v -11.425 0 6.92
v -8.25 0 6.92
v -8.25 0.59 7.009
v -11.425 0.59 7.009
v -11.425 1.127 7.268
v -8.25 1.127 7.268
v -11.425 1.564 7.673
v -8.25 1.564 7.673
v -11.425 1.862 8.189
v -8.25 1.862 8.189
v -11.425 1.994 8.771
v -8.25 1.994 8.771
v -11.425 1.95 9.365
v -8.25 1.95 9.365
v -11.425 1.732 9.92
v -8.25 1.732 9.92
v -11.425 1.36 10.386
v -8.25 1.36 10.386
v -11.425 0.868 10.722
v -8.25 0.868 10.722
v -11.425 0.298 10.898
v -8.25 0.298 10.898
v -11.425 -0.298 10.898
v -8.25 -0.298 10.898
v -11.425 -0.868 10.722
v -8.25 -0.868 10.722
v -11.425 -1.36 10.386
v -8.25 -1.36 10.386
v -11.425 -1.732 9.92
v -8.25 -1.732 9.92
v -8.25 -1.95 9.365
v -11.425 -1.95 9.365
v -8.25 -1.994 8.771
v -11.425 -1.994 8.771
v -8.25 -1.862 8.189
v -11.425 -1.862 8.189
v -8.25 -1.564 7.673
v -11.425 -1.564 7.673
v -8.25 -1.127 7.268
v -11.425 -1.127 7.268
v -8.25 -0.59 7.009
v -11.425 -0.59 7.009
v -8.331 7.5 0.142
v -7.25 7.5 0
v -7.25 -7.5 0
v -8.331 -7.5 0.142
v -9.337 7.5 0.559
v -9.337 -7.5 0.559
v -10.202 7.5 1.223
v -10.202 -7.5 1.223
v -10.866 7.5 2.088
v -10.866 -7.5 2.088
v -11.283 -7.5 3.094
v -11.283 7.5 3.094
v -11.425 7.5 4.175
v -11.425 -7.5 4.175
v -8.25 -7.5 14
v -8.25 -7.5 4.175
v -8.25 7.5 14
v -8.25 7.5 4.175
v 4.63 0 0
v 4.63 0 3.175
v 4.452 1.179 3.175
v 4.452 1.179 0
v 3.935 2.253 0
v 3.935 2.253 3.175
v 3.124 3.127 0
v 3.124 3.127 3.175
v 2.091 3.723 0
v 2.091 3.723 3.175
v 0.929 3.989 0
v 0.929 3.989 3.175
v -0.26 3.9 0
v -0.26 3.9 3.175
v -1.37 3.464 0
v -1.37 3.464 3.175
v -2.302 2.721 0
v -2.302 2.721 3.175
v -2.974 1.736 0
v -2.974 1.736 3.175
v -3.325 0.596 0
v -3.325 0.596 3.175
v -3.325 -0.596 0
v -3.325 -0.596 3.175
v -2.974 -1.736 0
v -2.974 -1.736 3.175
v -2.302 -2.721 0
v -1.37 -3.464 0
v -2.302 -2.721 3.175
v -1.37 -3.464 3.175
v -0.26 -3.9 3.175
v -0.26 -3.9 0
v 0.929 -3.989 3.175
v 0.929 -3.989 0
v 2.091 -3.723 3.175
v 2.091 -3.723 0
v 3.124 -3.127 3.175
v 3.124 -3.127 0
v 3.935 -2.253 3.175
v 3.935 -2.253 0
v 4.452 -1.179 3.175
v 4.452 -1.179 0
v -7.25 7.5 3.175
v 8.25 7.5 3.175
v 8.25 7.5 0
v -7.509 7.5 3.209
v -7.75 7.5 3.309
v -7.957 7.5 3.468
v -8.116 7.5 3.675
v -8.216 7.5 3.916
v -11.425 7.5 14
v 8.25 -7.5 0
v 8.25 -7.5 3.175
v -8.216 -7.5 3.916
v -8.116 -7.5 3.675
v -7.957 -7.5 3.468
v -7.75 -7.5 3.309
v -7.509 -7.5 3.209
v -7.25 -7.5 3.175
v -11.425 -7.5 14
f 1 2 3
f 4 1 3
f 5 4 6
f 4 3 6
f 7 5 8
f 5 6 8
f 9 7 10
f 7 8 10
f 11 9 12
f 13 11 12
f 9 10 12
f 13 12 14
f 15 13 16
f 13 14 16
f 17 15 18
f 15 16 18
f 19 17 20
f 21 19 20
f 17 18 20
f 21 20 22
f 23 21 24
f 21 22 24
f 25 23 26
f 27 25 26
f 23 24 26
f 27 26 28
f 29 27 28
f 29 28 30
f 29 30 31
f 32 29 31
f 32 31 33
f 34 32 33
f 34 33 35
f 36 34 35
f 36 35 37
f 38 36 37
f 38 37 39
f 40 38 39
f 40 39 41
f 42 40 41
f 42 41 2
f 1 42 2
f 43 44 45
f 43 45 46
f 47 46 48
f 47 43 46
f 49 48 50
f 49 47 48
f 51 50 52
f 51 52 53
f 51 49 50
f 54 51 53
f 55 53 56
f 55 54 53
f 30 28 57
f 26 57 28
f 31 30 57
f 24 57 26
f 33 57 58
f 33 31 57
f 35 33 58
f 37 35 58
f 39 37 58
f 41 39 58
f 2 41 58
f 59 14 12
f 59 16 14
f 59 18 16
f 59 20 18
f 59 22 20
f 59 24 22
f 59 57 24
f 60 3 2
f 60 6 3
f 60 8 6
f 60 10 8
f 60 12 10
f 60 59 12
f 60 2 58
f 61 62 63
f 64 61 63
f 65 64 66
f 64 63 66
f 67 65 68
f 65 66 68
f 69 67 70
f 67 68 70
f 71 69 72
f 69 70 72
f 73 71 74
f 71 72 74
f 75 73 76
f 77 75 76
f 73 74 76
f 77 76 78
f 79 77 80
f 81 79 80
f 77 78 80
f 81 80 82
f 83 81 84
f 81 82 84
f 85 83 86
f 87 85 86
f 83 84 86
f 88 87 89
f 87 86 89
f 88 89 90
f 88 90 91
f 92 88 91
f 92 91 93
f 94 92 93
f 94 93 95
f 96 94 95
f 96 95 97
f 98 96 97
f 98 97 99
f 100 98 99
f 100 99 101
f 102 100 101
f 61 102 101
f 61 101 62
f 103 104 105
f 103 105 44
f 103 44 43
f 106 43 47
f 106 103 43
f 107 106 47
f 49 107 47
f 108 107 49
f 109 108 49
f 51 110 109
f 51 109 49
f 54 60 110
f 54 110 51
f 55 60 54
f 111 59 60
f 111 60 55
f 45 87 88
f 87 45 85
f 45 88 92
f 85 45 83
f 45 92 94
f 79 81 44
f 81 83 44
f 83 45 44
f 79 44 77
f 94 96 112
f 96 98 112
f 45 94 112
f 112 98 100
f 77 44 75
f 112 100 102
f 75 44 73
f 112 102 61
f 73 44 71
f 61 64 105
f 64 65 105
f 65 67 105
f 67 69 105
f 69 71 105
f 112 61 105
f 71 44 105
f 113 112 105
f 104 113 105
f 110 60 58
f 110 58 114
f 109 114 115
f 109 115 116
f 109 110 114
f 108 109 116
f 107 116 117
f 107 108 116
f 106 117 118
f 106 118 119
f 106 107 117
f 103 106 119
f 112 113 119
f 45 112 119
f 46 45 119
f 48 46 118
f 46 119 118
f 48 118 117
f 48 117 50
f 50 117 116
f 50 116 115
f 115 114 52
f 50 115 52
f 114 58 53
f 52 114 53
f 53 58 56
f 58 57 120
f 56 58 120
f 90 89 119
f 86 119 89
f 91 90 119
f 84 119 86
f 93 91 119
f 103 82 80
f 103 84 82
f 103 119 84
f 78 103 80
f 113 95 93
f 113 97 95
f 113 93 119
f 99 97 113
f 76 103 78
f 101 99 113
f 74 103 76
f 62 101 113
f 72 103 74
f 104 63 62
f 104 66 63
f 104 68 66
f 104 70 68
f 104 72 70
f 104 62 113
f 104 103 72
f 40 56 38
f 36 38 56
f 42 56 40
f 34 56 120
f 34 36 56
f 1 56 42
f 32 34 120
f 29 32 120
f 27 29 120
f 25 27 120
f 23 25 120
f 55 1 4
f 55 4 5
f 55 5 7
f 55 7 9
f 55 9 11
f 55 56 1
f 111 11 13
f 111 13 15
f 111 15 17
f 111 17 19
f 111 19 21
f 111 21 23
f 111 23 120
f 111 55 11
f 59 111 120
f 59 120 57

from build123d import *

# Parameters (mm, degrees)
SKETCH1_W                    = 16.5
SKETCH1_H                    = 15
BASE_FLANGE1_DEPTH           = 3.175
EDGE_FLANGE1_STRIP_W         = 14.7
EDGE_FLANGE1_STRIP_H         = 3.175
EDGE_FLANGE1_STRIP_CUT_DEPTH = 15
EDGE_FLANGE1_DEPTH           = 15
SKETCH9_R                    = 4
CUT_EXTRUDE1_DEPTH           = 10
SKETCH10_R                   = 2
CUT_EXTRUDE2_DEPTH           = 10


# Sheet-metal steps are written as plain solids
with BuildPart() as part:
    # Sketch1 → Base-Flange1 (new body)
    with BuildSketch(Plane.XY):
        Rectangle(SKETCH1_W, SKETCH1_H)
    extrude(amount=BASE_FLANGE1_DEPTH)

    # Edge-Flange1 strip (across the edge) → Edge-Flange1 strip cut (cut)
    with BuildSketch(Plane(origin=(-8.25, 7.5, 3.175), x_dir=(1, 0, 0), z_dir=(0, -1, 0))):
        with Locations((-6.35, -1.5875)):
            Rectangle(EDGE_FLANGE1_STRIP_W, EDGE_FLANGE1_STRIP_H)
    extrude(amount=EDGE_FLANGE1_STRIP_CUT_DEPTH, mode=Mode.SUBTRACT)

    # Edge-Flange1 section (across the edge) → Edge-Flange1 (add)
    with BuildSketch(Plane(origin=(-8.25, 7.5, 3.175), x_dir=(1, 0, 0), z_dir=(0, -1, 0))):
        with BuildLine():
            Line((-3.175, 1), (-3.175, 10.825))
            Line((-3.175, 10.825), (0, 10.825))
            Line((0, 10.825), (0, 1))
            ThreePointArc((0, 1), (0.292893219, 0.292893219), (1, 0))
            Line((1, 0), (1, -3.175))
            ThreePointArc((1, -3.175), (-1.952170811, -1.952170811), (-3.175, 1))
        make_face()
    extrude(amount=EDGE_FLANGE1_DEPTH)

    # Sketch9 → Cut-Extrude1 (cut)
    with BuildSketch(Plane.XY.offset(3.175)):
        with Locations((0.63, 0)):
            Circle(SKETCH9_R)
    extrude(amount=-CUT_EXTRUDE1_DEPTH, mode=Mode.SUBTRACT)

    # Sketch10 → Cut-Extrude2 (cut)
    with BuildSketch(Plane(origin=(-8.25, 0, 0), x_dir=(0, 0, -1), z_dir=(1, 0, 0))):
        with Locations((-8.92, 0)):
            Circle(SKETCH10_R)
    extrude(amount=-CUT_EXTRUDE2_DEPTH, mode=Mode.SUBTRACT)


solid = part.part
